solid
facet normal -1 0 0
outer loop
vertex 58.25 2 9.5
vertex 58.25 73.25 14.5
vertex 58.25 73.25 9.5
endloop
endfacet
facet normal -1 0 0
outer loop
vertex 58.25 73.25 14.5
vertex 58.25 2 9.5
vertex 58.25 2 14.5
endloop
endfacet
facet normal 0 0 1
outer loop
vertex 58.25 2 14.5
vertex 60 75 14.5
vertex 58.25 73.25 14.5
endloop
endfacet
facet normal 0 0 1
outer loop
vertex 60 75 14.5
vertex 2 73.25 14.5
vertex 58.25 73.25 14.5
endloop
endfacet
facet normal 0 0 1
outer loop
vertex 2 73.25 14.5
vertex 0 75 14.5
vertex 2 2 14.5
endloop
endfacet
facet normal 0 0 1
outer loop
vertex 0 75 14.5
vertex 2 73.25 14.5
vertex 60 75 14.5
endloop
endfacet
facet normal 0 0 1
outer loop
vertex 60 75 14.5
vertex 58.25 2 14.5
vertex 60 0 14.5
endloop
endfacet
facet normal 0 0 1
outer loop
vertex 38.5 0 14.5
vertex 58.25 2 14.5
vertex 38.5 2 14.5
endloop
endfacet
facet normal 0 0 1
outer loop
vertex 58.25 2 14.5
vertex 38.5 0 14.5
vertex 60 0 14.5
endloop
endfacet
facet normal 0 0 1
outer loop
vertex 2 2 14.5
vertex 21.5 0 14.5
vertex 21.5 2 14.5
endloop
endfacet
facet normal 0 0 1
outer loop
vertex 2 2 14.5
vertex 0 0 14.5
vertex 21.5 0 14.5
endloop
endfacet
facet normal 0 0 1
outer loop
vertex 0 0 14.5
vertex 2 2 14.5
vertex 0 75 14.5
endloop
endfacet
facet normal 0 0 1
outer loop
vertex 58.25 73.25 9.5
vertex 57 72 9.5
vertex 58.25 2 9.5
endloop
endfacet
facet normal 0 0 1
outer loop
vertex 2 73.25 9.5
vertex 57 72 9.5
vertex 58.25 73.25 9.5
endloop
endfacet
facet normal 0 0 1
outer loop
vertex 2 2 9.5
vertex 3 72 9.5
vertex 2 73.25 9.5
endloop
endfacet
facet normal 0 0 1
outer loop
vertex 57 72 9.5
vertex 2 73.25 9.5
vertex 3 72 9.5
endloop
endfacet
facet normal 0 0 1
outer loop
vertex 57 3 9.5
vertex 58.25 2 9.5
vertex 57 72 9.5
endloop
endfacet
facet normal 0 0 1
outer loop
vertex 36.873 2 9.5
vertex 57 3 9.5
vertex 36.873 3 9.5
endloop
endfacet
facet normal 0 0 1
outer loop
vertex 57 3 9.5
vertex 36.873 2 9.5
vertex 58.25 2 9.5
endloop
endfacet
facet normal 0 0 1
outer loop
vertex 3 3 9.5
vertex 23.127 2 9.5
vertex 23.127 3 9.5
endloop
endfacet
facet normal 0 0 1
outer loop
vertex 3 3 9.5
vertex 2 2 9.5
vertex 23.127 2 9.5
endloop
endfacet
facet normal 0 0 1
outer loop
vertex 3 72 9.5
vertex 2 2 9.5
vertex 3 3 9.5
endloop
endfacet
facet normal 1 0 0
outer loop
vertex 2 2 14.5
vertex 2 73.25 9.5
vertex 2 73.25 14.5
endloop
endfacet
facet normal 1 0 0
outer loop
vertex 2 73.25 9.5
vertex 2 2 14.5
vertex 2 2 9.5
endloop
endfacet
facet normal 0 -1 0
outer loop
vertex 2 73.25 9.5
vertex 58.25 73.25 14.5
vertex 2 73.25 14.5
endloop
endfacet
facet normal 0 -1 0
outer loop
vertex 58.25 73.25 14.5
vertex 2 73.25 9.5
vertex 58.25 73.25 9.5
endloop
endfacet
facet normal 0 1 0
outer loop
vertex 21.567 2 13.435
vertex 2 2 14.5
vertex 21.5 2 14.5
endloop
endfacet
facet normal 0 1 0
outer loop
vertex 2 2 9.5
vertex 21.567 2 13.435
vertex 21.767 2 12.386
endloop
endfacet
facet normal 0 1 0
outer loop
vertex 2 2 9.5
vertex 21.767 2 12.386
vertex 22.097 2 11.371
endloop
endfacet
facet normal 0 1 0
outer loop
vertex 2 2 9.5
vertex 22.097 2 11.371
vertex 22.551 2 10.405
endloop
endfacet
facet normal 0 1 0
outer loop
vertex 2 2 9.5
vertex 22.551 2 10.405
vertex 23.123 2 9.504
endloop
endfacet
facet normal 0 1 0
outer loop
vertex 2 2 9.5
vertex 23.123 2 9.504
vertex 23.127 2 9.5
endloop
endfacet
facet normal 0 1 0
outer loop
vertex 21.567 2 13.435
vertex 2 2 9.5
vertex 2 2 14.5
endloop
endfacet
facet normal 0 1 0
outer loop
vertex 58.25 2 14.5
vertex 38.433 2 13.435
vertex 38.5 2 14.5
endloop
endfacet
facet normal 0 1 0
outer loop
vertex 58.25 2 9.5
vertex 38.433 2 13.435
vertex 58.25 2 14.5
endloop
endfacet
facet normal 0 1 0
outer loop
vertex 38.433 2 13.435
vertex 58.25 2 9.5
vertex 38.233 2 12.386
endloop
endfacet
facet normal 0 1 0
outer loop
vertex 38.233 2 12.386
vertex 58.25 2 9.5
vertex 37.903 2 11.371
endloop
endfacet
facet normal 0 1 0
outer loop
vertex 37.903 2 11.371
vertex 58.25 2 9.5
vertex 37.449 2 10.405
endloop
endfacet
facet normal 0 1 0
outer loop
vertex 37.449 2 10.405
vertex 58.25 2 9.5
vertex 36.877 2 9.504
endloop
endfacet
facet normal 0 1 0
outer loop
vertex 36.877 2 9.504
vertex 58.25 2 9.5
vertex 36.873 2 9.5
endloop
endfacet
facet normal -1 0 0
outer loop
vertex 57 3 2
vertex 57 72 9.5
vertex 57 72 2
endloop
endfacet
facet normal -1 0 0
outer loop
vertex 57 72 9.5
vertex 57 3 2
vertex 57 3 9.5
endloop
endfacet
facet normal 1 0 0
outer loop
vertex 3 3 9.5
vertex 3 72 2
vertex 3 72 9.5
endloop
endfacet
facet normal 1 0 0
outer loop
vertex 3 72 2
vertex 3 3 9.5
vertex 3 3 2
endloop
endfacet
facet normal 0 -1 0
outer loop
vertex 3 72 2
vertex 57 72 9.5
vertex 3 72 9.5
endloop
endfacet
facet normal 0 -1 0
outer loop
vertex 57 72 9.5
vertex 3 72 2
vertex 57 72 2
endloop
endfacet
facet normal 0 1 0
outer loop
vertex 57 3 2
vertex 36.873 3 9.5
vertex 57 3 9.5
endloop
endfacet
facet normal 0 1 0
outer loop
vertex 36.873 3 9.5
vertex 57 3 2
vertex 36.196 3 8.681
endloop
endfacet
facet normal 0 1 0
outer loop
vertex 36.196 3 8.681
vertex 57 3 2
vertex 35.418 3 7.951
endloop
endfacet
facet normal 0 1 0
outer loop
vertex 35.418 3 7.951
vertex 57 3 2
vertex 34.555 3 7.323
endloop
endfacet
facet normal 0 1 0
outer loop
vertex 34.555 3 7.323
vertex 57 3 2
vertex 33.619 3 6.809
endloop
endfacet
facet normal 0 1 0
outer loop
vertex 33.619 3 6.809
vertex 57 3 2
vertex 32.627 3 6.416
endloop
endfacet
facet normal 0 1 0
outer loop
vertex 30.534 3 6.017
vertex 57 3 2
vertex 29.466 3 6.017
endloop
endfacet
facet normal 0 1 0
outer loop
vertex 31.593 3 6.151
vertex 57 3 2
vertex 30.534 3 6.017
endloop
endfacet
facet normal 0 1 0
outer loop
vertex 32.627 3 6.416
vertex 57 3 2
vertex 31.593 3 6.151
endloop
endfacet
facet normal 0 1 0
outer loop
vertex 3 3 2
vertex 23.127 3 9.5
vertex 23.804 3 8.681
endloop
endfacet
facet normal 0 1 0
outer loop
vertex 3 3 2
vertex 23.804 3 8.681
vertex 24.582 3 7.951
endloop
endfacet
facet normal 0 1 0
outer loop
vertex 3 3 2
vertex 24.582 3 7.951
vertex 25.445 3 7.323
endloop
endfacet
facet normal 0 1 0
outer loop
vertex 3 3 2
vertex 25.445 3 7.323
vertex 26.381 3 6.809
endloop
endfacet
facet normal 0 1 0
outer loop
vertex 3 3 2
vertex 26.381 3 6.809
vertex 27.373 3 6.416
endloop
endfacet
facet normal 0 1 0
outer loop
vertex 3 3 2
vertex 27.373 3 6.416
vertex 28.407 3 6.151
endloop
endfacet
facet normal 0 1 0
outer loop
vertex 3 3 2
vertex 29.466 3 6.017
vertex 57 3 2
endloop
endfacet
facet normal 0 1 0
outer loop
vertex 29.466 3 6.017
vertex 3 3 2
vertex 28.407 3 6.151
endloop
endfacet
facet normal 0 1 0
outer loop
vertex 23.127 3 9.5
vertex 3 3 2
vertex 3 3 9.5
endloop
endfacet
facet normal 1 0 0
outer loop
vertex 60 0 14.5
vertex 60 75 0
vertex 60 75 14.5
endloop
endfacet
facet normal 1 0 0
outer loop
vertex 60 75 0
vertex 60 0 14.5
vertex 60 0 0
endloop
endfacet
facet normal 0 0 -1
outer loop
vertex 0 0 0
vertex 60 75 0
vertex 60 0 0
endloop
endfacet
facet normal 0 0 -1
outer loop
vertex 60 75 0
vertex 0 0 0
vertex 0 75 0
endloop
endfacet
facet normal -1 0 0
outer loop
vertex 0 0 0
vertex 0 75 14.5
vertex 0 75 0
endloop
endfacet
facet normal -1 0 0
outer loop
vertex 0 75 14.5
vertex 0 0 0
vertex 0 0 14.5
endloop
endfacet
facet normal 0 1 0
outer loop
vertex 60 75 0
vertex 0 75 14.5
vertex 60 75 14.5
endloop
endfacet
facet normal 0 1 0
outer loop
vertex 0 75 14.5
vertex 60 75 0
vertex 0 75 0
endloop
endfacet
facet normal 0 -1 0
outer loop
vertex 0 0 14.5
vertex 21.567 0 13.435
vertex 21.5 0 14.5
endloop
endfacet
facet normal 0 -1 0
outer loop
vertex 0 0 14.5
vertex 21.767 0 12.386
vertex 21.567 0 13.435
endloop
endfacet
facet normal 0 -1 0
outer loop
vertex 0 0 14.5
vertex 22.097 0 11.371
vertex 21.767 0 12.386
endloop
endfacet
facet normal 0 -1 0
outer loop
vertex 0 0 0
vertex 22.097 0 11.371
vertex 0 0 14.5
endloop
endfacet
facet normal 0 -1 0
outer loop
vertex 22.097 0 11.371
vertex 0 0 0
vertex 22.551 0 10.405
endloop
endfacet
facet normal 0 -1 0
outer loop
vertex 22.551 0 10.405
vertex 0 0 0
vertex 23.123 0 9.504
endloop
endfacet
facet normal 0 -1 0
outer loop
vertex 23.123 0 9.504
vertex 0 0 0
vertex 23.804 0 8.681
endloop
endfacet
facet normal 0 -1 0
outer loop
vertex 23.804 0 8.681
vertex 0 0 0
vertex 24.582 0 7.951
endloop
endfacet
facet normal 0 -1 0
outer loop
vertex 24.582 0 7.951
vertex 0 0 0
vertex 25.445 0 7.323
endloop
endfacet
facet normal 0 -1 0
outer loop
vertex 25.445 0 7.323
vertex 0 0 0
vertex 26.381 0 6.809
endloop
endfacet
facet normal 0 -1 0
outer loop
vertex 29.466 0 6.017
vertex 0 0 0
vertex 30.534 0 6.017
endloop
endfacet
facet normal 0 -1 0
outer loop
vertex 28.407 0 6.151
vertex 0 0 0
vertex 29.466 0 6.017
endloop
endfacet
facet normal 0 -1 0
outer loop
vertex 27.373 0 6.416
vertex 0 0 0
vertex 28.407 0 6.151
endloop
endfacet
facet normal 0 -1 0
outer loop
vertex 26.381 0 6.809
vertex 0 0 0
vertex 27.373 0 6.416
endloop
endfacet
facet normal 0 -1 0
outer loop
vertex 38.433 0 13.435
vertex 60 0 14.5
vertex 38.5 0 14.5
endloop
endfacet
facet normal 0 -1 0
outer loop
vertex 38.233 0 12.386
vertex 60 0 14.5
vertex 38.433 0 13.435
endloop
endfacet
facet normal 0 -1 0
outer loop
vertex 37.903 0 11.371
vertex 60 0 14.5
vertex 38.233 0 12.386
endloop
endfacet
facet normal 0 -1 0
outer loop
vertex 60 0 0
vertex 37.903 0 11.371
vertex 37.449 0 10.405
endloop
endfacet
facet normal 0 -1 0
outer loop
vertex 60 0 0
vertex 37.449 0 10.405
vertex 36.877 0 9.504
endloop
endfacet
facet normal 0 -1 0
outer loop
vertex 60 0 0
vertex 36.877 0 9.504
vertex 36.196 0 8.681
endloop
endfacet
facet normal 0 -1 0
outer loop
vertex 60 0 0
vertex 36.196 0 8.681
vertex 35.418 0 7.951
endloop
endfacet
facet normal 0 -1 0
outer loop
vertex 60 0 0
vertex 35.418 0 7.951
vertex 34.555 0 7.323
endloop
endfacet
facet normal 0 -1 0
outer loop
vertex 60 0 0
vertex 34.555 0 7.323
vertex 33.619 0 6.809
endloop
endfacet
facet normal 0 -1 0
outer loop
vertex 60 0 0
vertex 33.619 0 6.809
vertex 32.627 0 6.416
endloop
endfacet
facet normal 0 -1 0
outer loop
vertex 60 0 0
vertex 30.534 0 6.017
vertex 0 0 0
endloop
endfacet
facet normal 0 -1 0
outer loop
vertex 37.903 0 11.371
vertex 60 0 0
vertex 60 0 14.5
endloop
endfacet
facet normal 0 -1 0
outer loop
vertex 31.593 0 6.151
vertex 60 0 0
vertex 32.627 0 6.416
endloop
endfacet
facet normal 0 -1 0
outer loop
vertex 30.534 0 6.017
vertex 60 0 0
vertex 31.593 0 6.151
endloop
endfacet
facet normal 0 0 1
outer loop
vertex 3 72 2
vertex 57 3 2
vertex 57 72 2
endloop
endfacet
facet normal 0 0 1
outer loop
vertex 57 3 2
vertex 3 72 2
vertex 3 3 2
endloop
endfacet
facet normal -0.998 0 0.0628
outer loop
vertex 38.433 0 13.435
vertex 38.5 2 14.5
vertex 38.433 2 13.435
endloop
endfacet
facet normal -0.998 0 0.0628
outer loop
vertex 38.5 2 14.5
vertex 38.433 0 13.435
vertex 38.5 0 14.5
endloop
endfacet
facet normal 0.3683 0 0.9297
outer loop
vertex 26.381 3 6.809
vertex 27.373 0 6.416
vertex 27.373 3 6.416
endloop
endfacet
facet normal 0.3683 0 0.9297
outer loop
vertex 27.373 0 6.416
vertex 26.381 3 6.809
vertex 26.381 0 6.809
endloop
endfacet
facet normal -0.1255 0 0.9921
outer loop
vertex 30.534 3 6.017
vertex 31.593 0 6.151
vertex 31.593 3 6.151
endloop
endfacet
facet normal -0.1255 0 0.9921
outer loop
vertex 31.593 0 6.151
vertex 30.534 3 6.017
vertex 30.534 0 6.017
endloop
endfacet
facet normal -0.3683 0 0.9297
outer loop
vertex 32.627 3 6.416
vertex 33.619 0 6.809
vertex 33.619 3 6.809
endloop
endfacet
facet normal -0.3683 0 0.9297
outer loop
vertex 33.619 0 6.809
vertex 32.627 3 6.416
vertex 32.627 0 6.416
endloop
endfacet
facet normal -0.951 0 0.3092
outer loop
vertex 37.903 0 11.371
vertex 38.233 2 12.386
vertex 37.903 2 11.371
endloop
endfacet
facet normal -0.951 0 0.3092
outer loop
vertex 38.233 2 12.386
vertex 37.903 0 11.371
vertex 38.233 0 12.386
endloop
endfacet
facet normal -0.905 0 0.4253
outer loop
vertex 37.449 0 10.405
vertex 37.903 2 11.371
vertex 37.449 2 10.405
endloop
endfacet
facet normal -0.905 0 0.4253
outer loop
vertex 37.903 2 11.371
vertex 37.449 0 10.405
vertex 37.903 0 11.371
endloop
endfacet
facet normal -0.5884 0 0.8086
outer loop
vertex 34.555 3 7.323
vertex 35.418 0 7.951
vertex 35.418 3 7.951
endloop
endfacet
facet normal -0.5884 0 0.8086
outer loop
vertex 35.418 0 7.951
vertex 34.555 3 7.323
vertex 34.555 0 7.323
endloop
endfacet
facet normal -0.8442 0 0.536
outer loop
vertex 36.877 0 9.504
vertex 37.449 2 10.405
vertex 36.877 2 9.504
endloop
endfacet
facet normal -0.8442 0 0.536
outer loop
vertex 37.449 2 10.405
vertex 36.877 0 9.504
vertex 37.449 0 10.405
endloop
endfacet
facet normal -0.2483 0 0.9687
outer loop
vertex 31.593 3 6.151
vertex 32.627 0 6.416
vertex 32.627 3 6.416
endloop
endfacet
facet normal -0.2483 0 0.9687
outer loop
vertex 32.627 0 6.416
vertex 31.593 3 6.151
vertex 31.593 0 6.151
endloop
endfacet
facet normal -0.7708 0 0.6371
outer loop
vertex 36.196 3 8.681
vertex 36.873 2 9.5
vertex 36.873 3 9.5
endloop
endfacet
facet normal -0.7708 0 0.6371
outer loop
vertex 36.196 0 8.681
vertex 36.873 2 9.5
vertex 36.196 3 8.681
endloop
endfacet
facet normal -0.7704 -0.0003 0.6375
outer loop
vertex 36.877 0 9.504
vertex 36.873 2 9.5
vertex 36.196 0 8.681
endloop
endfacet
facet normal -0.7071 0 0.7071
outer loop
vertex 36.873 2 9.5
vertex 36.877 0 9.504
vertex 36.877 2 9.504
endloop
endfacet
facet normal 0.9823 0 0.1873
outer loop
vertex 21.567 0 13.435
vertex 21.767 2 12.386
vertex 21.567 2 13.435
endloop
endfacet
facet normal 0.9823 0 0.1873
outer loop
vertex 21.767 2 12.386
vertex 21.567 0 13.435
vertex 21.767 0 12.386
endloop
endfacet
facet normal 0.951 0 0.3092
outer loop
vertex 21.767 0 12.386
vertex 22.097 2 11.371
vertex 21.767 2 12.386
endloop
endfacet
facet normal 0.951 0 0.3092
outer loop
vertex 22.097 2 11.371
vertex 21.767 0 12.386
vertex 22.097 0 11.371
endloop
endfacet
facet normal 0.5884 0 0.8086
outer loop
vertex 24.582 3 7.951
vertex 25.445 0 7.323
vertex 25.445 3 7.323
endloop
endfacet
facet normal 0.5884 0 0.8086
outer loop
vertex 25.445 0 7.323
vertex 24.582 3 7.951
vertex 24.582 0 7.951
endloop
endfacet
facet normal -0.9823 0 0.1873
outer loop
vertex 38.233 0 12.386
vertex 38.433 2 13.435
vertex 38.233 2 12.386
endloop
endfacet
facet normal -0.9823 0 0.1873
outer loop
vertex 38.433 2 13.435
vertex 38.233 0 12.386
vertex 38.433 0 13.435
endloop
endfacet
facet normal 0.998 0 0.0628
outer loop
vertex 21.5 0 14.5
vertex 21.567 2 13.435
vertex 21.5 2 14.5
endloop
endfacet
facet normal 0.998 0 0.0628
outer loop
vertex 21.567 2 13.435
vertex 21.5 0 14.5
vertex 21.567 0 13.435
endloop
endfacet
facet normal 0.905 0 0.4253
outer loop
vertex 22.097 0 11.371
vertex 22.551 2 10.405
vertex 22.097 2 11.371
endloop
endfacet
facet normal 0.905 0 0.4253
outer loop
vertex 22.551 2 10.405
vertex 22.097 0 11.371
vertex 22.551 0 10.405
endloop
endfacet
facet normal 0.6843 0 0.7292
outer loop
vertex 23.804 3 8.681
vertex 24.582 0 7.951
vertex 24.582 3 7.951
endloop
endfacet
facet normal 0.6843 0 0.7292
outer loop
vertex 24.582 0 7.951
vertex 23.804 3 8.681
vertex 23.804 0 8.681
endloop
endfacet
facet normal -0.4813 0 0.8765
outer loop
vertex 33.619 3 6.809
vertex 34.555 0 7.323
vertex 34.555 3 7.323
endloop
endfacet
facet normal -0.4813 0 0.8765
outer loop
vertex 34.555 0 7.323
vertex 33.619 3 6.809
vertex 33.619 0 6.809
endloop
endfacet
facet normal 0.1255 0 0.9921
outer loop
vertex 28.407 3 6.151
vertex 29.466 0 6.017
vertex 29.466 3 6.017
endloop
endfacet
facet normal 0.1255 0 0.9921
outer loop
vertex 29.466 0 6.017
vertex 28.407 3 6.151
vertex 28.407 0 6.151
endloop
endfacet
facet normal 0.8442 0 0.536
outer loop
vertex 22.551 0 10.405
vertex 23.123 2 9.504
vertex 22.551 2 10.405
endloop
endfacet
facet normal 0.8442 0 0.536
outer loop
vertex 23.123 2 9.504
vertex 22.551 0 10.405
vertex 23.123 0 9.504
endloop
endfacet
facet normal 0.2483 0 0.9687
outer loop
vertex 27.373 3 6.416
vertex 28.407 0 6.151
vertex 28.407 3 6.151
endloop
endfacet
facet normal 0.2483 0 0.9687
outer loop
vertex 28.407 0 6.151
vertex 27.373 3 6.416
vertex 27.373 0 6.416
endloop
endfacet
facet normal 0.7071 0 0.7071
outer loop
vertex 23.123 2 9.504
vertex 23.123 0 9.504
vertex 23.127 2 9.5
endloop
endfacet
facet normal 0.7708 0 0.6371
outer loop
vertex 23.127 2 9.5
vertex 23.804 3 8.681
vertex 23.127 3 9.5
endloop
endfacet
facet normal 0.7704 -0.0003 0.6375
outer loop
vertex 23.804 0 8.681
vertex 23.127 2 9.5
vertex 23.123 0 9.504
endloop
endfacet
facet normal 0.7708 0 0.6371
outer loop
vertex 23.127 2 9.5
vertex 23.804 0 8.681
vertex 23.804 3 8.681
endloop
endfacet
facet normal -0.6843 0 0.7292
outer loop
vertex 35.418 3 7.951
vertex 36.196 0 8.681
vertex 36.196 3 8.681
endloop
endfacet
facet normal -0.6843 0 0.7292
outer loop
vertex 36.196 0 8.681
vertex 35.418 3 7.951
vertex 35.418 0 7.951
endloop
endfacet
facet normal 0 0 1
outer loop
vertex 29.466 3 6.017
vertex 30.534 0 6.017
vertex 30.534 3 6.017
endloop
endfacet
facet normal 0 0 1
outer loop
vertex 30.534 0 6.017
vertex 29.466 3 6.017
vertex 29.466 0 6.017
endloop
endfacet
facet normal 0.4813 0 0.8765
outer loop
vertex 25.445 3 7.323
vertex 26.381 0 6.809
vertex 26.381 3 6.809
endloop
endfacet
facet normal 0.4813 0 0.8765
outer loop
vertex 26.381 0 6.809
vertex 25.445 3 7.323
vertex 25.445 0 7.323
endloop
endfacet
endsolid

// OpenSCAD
placa_x=54;
placa_y=69; //56 + lugar para el prensacables
placa_z=25;

ancho_tapa=2;
ancho_pared=3;
alto_tapa=14;
radio_prensacable=8.5;

ancho_usb=11.5;
alto_usb=8;

/*
module tapa(){
    difference(){
        union(){
            difference(){
                cube([placa_x+ancho_pared*2, placa_y+ancho_pared*2, placa_z+ancho_tapa*2]);
                
                translate([ancho_pared, ancho_pared, ancho_tapa])
                    cube([placa_x, placa_y, placa_z]);
                //Le saco la mitad de abajo
                cube([placa_x+ancho_pared*2, placa_y+ancho_pared*2, (placa_z+ancho_tapa*2)/2]);
            }
            //Aleta para enganchar
            translate([ancho_pared-1, ancho_pared-1, (placa_z+ancho_tapa*2)/2-4.5]){
                difference(){
                    cube([placa_x+1.75, placa_y+1.75, 4.5]);
                    translate([1, 1, 0])
                        cube([placa_x, placa_y, 4.5]);
                }
            }
        }
        //Agujero para el prensacables
        translate([(placa_x+ancho_pared*2)/2, ancho_pared+2, (placa_z+ancho_tapa*2)/2]){
            rotate([90, 0, 0]){
                cylinder(r=radio_prensacable, h=ancho_pared+4, $fn=50);
                translate([0, -radio_prensacable/2, (ancho_pared+4)/2])
                    cube([radio_prensacable*2, radio_prensacable, ancho_pared+4], center=true);
            }           
        }
        //Agujero para el USB
        translate([ancho_pared+8, placa_y-2, 10])
            #cube([ancho_usb, alto_usb, ancho_pared+10]);
        
        //Agujero para que se vean los leds del arduino
        translate([ancho_pared+8-0.5, 30, (alto_tapa*2)-4.7])
            cube([(ancho_usb/4)*3, ancho_usb/2, ancho_pared+2]);
        //Agujero para que se vean los leds del arduino
        translate([ancho_pared+8+(ancho_usb/4)*3-0.5, 30, (alto_tapa*2)-5.2])
            #cube([ancho_usb/4, ancho_usb/2, ancho_pared+2]);

        //Texto
        translate([(placa_x+ancho_pared*2)/2, (placa_y+ancho_pared*2)/2, (placa_z+ancho_tapa*2)-1])
            rotate([0, 0, 90])
                #linear_extrude(height = 4) {text("IIBM", font = "Arial", size=22,$fn=25, halign="center", valign="center");}
    }
}

tapa();
*/

module base(){
    difference(){
        union(){
            difference(){
                cube([placa_x+ancho_pared*2, placa_y+ancho_pared*2, placa_z+ancho_tapa*2]);
                
                translate([ancho_pared, ancho_pared, ancho_tapa])
                    cube([placa_x, placa_y, placa_z]);
                //Le saco la mitad de arriba
                translate([0, 0, (placa_z+ancho_tapa*2)/2])
                    cube([placa_x+ancho_pared*2, placa_y+ancho_pared*2, (placa_z+ancho_tapa*2)/2]);
                //Aleta para enganchar
                translate([ancho_pared-1, ancho_pared-1, (placa_z+ancho_tapa*2)/2-5]){
                    difference(){
                        cube([placa_x+2.25, placa_y+2.25, 5]);
                        translate([1, 1, 0])
                            cube([placa_x, placa_y, 5]);
                    }
                }
            }
        }
        //Agujero para el prensacables
        translate([(placa_x+ancho_pared*2)/2, ancho_pared+2, (placa_z+ancho_tapa*2)/2])
            rotate([90, 0, 0])
                cylinder(r=radio_prensacable, h=ancho_pared+4, $fn=50); 
    }
}

base();
